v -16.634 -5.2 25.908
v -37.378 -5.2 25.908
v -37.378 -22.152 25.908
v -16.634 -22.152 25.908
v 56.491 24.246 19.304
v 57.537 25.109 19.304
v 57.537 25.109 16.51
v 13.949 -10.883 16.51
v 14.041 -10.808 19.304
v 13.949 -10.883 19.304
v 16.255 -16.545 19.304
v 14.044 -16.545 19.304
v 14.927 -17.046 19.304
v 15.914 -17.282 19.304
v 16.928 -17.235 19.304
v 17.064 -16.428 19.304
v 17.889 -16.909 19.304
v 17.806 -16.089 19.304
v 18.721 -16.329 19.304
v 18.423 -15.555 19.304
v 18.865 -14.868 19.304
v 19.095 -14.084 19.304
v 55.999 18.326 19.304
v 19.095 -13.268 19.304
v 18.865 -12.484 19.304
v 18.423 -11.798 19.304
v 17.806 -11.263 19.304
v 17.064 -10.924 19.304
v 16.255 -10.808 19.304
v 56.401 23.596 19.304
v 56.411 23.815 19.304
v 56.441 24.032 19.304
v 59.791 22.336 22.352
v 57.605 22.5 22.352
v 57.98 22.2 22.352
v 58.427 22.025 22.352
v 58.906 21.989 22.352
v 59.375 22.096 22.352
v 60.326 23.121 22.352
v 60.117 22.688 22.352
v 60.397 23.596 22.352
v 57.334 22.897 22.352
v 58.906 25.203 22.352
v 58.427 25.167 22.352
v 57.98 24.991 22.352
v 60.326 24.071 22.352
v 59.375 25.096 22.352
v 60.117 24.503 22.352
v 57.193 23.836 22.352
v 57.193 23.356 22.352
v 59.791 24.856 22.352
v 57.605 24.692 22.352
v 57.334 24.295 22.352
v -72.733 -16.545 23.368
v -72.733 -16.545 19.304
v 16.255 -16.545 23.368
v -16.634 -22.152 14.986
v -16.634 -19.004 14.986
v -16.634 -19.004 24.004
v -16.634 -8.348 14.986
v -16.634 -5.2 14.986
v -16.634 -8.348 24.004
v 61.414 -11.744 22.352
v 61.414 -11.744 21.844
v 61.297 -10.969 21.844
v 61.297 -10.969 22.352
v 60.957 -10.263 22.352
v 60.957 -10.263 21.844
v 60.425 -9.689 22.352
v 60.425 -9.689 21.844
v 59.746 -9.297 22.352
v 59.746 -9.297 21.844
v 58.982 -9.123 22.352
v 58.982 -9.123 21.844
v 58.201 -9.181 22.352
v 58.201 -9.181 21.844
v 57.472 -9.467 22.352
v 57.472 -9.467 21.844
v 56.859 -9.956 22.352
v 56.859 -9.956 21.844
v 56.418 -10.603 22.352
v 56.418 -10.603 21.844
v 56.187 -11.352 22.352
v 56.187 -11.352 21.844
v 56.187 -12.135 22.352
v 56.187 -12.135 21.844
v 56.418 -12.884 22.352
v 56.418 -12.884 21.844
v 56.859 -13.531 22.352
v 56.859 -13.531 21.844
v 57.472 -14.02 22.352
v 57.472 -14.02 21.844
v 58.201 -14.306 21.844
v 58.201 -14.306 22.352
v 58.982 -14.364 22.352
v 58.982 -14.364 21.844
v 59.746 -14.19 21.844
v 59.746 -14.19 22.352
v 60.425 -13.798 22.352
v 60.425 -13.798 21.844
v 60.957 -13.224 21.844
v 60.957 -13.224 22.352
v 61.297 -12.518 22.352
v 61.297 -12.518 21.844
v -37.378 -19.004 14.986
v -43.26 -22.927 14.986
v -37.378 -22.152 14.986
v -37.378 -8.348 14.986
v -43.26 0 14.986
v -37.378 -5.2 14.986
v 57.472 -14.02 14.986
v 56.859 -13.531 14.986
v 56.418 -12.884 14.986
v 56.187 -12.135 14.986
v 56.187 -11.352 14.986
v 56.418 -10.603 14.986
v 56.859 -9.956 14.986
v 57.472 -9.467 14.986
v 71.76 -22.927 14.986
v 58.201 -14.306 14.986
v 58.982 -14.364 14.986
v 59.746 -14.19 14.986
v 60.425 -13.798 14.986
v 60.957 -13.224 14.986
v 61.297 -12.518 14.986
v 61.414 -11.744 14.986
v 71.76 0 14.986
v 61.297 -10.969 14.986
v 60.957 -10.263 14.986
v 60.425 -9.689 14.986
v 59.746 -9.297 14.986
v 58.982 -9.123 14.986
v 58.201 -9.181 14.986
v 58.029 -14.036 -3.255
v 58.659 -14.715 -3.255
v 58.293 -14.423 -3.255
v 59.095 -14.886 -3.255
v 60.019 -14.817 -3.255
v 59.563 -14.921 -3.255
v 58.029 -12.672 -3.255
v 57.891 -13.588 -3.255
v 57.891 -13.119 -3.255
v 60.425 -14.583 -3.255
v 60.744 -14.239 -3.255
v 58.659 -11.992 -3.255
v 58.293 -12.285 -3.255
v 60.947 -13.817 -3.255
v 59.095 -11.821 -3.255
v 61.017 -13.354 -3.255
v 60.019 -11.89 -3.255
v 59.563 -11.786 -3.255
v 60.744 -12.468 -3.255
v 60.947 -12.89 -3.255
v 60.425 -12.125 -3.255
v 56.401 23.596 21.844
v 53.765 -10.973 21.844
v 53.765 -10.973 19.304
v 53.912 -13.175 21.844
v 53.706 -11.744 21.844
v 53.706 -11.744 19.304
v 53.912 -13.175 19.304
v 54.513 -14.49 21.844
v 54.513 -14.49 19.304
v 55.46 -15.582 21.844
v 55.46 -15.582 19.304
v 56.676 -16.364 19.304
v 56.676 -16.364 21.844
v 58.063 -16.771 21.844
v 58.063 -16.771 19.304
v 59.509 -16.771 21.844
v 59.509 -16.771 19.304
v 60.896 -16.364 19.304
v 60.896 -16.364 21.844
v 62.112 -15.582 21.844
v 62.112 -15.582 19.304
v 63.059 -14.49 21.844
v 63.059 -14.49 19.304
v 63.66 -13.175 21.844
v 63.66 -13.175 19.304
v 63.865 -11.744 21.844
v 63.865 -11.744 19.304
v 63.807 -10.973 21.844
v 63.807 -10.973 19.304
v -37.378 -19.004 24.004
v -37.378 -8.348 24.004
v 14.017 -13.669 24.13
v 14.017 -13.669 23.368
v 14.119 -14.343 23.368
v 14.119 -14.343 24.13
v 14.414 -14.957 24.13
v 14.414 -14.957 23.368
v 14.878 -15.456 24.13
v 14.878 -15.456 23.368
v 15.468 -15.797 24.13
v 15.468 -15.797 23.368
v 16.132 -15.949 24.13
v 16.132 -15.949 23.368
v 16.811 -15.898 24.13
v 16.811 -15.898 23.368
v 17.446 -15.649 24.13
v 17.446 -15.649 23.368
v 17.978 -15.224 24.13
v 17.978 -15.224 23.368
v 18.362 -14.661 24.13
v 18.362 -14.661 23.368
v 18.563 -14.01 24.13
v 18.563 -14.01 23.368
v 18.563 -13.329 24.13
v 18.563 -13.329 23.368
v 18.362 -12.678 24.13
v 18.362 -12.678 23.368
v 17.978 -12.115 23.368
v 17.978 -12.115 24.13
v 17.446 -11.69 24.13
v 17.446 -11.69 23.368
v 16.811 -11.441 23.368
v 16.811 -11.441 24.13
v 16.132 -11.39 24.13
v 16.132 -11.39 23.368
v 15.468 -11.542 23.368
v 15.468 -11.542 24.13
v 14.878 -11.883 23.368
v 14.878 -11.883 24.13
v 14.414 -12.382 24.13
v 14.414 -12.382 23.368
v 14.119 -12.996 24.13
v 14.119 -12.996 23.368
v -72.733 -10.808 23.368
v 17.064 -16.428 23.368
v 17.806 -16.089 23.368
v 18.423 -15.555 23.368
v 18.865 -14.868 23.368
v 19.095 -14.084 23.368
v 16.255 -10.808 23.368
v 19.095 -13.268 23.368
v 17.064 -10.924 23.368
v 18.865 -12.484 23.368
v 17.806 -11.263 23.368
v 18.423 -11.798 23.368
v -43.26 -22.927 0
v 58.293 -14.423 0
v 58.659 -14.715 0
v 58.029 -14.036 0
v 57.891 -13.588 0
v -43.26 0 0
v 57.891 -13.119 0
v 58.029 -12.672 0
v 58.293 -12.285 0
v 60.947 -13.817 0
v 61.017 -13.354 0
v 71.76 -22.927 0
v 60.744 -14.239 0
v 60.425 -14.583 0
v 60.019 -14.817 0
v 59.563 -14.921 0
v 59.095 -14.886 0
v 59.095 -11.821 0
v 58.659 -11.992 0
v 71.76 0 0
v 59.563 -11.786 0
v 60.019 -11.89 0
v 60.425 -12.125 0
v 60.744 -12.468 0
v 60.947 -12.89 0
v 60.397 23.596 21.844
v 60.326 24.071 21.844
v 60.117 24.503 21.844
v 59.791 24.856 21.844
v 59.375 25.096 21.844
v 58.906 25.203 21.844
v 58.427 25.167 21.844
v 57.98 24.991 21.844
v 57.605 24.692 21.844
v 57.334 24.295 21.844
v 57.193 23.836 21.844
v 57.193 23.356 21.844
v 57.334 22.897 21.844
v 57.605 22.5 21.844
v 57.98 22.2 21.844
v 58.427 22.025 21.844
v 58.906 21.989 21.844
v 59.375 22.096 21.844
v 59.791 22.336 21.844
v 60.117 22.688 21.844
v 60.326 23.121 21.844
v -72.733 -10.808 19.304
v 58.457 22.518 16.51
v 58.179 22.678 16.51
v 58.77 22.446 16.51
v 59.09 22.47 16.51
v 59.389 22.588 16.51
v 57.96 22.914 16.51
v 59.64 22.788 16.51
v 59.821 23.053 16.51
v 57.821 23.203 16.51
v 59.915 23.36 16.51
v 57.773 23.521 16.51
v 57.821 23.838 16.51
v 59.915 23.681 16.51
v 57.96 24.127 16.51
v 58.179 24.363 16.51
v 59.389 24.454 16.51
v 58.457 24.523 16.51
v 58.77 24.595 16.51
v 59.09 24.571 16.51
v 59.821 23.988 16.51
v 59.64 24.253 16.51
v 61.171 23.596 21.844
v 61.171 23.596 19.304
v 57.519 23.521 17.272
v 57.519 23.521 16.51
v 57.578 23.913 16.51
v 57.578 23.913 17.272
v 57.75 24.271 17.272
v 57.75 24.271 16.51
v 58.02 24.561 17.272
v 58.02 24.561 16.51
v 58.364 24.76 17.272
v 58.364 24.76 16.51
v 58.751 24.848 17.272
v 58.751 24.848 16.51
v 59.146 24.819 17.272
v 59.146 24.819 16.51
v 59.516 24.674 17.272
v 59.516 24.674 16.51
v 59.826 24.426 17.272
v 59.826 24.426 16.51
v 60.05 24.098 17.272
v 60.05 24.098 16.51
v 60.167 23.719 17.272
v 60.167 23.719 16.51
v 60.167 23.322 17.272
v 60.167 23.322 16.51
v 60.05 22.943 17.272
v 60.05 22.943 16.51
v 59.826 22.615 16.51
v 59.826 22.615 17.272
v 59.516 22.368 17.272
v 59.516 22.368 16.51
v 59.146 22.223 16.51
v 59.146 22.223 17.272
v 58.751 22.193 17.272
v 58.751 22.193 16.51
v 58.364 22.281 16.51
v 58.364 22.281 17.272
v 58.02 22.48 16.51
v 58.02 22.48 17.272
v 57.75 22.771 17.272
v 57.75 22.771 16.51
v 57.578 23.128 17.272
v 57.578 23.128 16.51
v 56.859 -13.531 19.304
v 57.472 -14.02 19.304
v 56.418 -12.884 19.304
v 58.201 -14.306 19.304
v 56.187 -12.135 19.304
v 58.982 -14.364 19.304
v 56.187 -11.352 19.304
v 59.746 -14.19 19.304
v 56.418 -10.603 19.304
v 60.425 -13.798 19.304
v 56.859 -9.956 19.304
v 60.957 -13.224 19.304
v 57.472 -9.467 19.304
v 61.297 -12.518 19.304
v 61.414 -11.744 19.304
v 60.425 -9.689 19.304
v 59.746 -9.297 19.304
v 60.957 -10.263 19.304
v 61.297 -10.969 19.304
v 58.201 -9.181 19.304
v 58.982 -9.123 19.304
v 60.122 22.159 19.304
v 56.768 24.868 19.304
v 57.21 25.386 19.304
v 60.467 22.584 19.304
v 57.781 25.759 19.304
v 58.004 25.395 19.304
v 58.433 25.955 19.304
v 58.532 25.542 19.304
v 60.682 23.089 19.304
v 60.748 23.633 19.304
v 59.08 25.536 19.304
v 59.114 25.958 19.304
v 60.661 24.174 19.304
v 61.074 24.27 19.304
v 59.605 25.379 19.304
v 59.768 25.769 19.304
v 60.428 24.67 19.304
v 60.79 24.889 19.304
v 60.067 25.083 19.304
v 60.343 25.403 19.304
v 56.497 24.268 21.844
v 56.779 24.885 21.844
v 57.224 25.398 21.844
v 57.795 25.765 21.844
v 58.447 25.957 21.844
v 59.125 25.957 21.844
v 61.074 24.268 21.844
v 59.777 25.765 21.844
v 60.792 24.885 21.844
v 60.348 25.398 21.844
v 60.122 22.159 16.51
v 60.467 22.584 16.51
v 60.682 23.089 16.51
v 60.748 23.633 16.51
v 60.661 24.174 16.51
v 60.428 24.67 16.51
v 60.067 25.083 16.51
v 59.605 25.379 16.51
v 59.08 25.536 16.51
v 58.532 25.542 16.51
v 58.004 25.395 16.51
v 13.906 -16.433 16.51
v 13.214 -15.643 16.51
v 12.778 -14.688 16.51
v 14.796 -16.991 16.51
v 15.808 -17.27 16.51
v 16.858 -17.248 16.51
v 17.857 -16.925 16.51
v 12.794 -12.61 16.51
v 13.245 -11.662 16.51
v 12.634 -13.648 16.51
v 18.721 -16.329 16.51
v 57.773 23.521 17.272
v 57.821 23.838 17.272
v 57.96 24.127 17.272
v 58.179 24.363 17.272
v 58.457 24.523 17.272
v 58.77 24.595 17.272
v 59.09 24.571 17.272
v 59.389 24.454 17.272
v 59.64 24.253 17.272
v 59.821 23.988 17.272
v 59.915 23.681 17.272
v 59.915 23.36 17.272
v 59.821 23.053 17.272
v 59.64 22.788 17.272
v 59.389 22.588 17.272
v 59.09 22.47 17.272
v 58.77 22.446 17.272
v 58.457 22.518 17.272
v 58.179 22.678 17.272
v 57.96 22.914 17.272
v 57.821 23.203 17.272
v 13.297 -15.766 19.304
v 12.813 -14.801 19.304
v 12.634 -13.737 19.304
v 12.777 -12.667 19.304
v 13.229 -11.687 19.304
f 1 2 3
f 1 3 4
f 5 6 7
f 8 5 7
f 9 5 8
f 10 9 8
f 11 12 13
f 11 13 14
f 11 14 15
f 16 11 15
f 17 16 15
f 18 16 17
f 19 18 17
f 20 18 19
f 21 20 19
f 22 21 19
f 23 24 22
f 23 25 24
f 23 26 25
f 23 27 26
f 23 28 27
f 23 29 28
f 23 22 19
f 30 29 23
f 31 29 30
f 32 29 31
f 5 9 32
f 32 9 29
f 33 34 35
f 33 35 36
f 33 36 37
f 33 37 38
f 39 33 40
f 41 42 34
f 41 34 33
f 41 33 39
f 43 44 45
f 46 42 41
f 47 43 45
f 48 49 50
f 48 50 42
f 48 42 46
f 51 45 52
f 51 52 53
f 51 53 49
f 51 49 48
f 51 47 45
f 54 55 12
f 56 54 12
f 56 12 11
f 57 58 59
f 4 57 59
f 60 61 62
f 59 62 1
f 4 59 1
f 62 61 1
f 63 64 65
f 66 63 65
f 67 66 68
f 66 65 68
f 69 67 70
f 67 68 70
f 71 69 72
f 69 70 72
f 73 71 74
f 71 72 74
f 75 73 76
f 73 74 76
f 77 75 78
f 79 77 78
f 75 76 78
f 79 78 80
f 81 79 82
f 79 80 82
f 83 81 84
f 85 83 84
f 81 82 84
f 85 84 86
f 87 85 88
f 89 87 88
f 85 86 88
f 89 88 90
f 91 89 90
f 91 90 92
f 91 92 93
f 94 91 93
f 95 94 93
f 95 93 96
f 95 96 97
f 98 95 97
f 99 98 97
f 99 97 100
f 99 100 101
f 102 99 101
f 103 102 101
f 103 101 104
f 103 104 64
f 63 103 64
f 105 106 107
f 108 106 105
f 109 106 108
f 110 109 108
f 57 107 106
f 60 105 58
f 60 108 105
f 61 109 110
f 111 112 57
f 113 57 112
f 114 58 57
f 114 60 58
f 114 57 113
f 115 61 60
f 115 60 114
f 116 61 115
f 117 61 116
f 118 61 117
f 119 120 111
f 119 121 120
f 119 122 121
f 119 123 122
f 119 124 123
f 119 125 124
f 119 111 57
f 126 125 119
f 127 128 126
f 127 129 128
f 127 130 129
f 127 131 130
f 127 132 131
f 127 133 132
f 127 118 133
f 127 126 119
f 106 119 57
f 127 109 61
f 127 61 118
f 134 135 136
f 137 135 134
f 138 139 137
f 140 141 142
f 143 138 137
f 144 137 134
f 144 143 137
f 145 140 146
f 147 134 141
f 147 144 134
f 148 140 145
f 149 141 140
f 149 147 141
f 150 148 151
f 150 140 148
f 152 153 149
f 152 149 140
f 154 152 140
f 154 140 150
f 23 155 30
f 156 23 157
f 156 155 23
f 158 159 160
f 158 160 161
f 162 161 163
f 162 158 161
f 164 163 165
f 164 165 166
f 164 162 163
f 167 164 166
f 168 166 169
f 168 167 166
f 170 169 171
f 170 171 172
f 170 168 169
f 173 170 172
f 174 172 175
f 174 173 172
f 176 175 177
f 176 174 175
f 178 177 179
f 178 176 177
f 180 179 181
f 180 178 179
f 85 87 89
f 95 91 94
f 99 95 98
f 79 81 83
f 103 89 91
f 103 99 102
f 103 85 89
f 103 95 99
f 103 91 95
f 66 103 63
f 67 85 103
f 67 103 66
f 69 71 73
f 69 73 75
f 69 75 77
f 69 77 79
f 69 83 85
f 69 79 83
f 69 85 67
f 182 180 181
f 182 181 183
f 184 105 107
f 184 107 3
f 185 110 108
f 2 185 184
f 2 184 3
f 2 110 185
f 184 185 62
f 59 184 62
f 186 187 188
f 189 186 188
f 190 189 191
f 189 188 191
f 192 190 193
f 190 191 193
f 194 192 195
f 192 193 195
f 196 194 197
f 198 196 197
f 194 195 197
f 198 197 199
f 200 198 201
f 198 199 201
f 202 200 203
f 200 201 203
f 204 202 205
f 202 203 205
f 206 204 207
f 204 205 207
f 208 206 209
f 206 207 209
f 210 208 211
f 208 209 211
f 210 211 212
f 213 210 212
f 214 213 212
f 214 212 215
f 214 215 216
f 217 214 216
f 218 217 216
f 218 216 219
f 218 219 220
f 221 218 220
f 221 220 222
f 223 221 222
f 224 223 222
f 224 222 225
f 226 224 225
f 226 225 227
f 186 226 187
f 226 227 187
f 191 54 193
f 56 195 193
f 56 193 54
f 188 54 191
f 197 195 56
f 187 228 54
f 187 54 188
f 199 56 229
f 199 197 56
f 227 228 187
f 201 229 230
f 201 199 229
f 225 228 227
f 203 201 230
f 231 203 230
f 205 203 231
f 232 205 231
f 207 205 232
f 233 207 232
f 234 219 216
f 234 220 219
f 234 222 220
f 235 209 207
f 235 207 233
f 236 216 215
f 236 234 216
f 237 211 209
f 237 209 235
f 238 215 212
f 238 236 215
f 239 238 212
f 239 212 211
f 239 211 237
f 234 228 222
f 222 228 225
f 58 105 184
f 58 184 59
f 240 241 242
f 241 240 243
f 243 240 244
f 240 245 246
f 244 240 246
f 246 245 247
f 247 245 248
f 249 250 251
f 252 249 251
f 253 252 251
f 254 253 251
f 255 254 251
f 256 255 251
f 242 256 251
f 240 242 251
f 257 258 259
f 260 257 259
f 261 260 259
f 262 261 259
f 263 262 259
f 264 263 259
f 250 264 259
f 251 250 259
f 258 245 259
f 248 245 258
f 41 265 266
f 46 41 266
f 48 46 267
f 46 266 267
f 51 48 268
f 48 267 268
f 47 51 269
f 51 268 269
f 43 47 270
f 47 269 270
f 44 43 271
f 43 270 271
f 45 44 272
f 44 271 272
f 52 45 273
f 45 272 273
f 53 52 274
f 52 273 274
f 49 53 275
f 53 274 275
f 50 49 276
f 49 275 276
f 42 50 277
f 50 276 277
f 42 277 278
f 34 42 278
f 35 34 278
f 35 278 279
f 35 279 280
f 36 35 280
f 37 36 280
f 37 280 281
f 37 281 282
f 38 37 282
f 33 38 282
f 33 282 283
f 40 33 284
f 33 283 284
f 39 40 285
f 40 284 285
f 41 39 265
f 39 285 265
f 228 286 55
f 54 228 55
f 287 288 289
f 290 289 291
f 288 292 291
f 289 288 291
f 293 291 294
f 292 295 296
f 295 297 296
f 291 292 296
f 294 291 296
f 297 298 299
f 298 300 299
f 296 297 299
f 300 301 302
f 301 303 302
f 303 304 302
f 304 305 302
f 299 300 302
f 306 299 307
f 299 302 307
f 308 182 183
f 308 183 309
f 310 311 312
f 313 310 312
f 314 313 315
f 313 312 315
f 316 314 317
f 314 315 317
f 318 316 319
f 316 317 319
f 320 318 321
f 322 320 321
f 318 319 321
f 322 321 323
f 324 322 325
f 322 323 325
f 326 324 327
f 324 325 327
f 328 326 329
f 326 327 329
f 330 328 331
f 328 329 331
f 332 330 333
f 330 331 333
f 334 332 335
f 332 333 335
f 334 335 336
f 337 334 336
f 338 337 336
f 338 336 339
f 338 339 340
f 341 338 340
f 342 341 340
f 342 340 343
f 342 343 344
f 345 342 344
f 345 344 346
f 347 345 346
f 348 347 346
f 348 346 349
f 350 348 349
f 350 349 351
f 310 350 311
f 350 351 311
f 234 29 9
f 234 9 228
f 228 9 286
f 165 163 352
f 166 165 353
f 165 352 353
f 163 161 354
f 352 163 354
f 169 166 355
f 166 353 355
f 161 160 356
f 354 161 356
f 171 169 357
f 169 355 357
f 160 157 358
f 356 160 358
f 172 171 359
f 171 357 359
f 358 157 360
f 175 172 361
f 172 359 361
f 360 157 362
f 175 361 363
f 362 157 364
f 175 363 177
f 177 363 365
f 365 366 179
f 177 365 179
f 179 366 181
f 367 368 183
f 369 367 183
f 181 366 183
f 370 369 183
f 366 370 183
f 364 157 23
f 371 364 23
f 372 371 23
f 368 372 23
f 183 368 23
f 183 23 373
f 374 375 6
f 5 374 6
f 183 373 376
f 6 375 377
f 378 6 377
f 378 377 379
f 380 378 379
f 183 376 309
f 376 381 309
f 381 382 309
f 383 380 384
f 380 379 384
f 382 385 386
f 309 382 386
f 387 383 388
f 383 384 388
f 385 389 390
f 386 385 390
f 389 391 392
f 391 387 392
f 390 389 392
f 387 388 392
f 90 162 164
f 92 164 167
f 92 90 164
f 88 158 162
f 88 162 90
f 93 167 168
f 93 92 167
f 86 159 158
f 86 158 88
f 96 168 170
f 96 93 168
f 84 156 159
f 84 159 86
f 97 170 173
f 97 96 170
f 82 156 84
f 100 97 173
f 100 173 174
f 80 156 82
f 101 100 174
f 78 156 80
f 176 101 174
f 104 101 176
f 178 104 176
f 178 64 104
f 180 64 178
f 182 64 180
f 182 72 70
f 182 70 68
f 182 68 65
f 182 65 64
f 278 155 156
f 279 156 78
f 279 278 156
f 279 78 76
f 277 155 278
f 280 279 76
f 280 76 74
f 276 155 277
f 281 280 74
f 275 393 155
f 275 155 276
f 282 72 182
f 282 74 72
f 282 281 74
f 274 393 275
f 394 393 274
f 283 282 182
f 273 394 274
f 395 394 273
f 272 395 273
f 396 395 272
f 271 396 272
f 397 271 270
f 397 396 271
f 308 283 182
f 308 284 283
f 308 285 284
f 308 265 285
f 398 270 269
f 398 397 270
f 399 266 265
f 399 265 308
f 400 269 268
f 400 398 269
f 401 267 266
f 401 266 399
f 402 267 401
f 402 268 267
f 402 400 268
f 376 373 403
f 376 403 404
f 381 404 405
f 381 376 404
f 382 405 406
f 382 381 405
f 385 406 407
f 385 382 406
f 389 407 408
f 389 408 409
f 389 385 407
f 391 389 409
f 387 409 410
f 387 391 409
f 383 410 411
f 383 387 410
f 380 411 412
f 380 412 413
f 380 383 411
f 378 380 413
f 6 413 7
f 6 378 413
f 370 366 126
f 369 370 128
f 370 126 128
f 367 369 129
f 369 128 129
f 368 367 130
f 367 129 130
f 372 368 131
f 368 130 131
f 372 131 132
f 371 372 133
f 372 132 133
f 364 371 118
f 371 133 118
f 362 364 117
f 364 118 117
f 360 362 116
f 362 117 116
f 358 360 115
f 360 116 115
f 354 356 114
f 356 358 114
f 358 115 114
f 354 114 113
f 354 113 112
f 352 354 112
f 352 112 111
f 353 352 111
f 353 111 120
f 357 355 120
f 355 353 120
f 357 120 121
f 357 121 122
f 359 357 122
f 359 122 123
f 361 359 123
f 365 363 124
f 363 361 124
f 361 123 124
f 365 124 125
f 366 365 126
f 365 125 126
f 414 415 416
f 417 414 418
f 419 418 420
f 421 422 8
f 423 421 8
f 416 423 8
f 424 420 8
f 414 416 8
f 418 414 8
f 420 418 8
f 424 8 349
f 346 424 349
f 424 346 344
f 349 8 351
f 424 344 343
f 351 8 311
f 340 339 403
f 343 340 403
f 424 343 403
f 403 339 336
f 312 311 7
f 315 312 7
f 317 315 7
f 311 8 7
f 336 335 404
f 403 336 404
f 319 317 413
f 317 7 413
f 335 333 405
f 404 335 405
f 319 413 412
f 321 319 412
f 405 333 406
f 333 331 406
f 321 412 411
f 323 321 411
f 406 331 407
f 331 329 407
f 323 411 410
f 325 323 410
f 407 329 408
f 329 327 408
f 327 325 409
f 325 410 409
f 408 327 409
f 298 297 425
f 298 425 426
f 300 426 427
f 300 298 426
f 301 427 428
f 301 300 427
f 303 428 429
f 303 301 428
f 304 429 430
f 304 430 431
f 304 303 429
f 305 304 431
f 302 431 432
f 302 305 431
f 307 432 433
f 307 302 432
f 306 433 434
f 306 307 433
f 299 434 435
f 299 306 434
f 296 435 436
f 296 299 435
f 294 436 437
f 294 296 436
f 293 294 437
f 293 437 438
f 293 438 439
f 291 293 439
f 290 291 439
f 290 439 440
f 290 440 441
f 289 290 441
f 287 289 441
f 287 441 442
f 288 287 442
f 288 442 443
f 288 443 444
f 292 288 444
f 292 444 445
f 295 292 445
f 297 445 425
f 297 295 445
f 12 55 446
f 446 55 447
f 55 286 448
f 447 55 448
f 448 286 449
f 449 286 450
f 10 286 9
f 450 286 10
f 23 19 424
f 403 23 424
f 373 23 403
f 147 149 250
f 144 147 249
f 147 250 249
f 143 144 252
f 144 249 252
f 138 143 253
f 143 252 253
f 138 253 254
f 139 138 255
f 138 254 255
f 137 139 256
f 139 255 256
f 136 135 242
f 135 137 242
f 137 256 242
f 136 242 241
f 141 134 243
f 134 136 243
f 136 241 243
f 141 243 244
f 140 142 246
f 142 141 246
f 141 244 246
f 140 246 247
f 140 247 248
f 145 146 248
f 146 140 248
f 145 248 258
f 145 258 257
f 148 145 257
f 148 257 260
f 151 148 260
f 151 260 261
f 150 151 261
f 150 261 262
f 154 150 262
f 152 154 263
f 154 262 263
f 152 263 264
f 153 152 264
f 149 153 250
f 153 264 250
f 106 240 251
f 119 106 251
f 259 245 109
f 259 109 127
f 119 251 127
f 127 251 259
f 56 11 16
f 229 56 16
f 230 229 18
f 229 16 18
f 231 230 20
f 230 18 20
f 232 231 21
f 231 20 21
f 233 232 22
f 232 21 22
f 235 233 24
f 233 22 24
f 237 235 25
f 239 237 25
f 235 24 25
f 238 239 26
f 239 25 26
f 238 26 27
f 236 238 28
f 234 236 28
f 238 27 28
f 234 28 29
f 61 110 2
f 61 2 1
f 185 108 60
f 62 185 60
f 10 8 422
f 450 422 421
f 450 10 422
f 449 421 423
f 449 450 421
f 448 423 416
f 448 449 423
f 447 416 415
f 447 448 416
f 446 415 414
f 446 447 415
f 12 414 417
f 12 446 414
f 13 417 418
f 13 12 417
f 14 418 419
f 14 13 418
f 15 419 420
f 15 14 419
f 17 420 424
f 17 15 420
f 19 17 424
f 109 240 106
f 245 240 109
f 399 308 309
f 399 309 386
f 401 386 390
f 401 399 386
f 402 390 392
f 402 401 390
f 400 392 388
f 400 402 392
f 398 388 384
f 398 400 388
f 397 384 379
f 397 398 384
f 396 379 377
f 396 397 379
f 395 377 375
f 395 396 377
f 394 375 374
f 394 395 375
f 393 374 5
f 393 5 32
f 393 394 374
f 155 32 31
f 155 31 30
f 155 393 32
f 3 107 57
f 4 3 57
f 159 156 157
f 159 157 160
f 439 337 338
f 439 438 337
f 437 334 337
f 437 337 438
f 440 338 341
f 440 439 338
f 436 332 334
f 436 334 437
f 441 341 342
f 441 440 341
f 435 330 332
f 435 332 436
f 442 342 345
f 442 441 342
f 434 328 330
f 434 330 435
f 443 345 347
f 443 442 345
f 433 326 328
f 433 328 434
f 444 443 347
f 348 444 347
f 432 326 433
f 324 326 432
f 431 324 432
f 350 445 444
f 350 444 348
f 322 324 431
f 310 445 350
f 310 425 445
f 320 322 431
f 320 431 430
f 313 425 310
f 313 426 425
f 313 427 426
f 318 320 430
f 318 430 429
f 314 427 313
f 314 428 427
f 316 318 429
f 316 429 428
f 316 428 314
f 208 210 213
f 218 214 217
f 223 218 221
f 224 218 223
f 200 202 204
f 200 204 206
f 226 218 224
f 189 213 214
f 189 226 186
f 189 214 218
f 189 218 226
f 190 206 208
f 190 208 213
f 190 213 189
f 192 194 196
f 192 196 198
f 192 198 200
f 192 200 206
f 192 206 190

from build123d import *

# Parameters (mm, degrees)
SKETCH_1_W          = 115.019292035
SKETCH_1_H          = 22.927433628
EXTRUDE_1_DEPTH     = 14.986
SKETCH_2_R          = 2.628127437
EXTRUDE_2_DEPTH     = 7.366
EXTRUDE_3_DEPTH     = 2.54
EXTRUDE_4_DEPTH     = 2.794
SKETCH_6_R          = 1.611317842
EXTRUDE_5_DEPTH     = 0.508
EXTRUDE_6_DEPTH     = 4.064
SKETCH_8_W          = 20.74444914
SKETCH_8_H          = 3.147990337
SKETCH_8_H_2        = 3.147990336
EXTRUDE_7_DEPTH     = 10.922
SKETCH_9_W          = 20.74444914
SKETCH_9_H          = 1.904400454
EXTRUDE_8_DEPTH     = 10.922
SKETCH_10_R         = 2.28563118
EXTRUDE_9_DEPTH     = 0.762
SKETCH_11_R         = 1.571986642
EXTRUDE_10_DEPTH    = 3.302
SKETCH_12_W         = 17.575344956
SKETCH_12_H         = 16.755162191
EXTRUDE_11_DEPTH    = 13.462
SKETCH_13_R         = 1.331265642
SKETCH_13_R_2       = 1.077265642
CUT_EXTRUDE_1_DEPTH = 0.762
SKETCH_14_W         = 16.834327137
SKETCH_14_H         = 20.427018904
CUT_EXTRUDE_2_DEPTH = 28.194


with BuildPart() as part:
    # 草图1 → 凸台-拉伸1 (new body)
    with BuildSketch(Plane.XY):
        with Locations((14.25011379, -11.463716814)):
            Rectangle(SKETCH_1_W, SKETCH_1_H)
    extrude(amount=EXTRUDE_1_DEPTH)

    # 草图2 → 凸台-拉伸2 (add)
    with BuildSketch(Plane.XY.offset(14.986)):
        with Locations((58.785943209, -11.743523072)):
            Circle(SKETCH_2_R)
    extrude(amount=EXTRUDE_2_DEPTH)

    # 草图3 → 凸台-拉伸3 (add)
    with BuildSketch(Plane.XY.offset(21.844)):
        with BuildLine():
            Line((53.76517402, -10.973439102), (53.706459714, -11.743523072))
            ThreePointArc((53.706459714, -11.743523072), (58.785943209, -16.823006567), (63.865426703, -11.743523072))
            Line((63.865426703, -11.743523072), (63.806712398, -10.973439102))
            Line((63.806712398, -10.973439102), (61.171013627, 23.595808677))
            ThreePointArc((61.171013627, 23.595808677), (58.785943209, 25.980879095), (56.400872791, 23.595808677))
            Line((56.400872791, 23.595808677), (53.76517402, -10.973439102))
        make_face()
    extrude(amount=-EXTRUDE_3_DEPTH)

    # 草图5 → 凸台-拉伸4 (add)
    with BuildSketch(Plane(origin=(0, 0, 19.304), x_dir=(-1, 0, 0), z_dir=(0, 0, -1))):
        with BuildLine():
            Line((-57.536519865, 25.108887591), (-13.949230135, -10.883271683))
            ThreePointArc((-13.949230135, -10.883271683), (-13.53146296, -16.06321478), (-18.721435344, -16.328783135))
            Line((-18.721435344, -16.328783135), (-60.121986544, 22.158639689))
            ThreePointArc((-60.121986544, 22.158639689), (-60.261702819, 24.88909908), (-57.536519865, 25.108887591))
        make_face()
    extrude(amount=EXTRUDE_4_DEPTH)

    # 草图6 → 凸台-拉伸5 (add)
    with BuildSketch(Plane.XY.offset(21.844)):
        with Locations((58.785943209, 23.595808677)):
            Circle(SKETCH_6_R)
    extrude(amount=EXTRUDE_5_DEPTH)

    # 草图7 → 凸台-拉伸6 (add)
    with BuildSketch(Plane.XY.offset(19.304)):
        with BuildLine():
            Line((16.255391973, -10.80751129), (-72.73334393, -10.80751129))
            Line((-72.73334393, -10.80751129), (-72.73334393, -16.544656626))
            Line((-72.73334393, -16.544656626), (16.255391973, -16.544656626))
            ThreePointArc((16.255391973, -16.544656626), (19.123964641, -13.676083958), (16.255391973, -10.80751129))
        make_face()
    extrude(amount=EXTRUDE_6_DEPTH)

    # 草图8 → 凸台-拉伸7 (add)
    with BuildSketch(Plane.XY.offset(14.986)):
        with Locations((-27.006170601, -20.578235082)):
            Rectangle(SKETCH_8_W, SKETCH_8_H)
        with Locations((-27.006170601, -6.773932835)):
            Rectangle(SKETCH_8_W, SKETCH_8_H_2)
    extrude(amount=EXTRUDE_7_DEPTH)

    # 草图9 → 凸台-拉伸8 (add)
    with BuildSketch(Plane.XZ.offset(8.347928003)):
        with Locations((-27.006170601, 24.955799773)):
            Rectangle(SKETCH_9_W, SKETCH_9_H)
    extrude(amount=EXTRUDE_8_DEPTH)

    # 草图10 → 凸台-拉伸9 (add)
    with BuildSketch(Plane.XY.offset(23.368)):
        with Locations(Location((16.302879151, -13.669496202, 0), (0, 0, 180))):
            Circle(SKETCH_10_R)
    extrude(amount=EXTRUDE_9_DEPTH)

    # 草图11 → 凸台-拉伸10 (add)
    with BuildSketch(Plane(origin=(0, 0, 0), x_dir=(-1, 0, 0), z_dir=(0, 0, -1))):
        with Locations(Location((-59.445134238, -13.353735996, 0), (0, 0, 180))):
            Circle(SKETCH_11_R)
    extrude(amount=EXTRUDE_10_DEPTH)

    # 草图12 → 凸台-拉伸11 (add)
    with BuildSketch(Plane(origin=(0, 0, -3.302), x_dir=(-1, 0, 0), z_dir=(0, 0, -1))):
        with Locations((-59.093627339, -14.115334278)):
            Rectangle(SKETCH_12_W, SKETCH_12_H)
    extrude(amount=EXTRUDE_11_DEPTH)

    # 草图13 → 切除-拉伸1 (cut)
    with BuildSketch(Plane(origin=(0, 0, 16.51), x_dir=(-1, 0, 0), z_dir=(0, 0, -1))):
        with Locations((-58.850171018, 23.520615078)):
            Circle(SKETCH_13_R)
        with Locations((-58.850171018, 23.520615078)):
            Circle(SKETCH_13_R_2, mode=Mode.SUBTRACT)
    extrude(amount=-CUT_EXTRUDE_1_DEPTH, mode=Mode.SUBTRACT)

    # 草图14 → 切除-拉伸2 (cut)
    with BuildSketch(Plane(origin=(67.881299817, 0, 0), x_dir=(0, 0, -1), z_dir=(1, 0, 0))):
        with Locations((11.672099204, -13.921851865)):
            Rectangle(SKETCH_14_W, SKETCH_14_H)
    extrude(amount=-CUT_EXTRUDE_2_DEPTH, mode=Mode.SUBTRACT)


solid = part.part
